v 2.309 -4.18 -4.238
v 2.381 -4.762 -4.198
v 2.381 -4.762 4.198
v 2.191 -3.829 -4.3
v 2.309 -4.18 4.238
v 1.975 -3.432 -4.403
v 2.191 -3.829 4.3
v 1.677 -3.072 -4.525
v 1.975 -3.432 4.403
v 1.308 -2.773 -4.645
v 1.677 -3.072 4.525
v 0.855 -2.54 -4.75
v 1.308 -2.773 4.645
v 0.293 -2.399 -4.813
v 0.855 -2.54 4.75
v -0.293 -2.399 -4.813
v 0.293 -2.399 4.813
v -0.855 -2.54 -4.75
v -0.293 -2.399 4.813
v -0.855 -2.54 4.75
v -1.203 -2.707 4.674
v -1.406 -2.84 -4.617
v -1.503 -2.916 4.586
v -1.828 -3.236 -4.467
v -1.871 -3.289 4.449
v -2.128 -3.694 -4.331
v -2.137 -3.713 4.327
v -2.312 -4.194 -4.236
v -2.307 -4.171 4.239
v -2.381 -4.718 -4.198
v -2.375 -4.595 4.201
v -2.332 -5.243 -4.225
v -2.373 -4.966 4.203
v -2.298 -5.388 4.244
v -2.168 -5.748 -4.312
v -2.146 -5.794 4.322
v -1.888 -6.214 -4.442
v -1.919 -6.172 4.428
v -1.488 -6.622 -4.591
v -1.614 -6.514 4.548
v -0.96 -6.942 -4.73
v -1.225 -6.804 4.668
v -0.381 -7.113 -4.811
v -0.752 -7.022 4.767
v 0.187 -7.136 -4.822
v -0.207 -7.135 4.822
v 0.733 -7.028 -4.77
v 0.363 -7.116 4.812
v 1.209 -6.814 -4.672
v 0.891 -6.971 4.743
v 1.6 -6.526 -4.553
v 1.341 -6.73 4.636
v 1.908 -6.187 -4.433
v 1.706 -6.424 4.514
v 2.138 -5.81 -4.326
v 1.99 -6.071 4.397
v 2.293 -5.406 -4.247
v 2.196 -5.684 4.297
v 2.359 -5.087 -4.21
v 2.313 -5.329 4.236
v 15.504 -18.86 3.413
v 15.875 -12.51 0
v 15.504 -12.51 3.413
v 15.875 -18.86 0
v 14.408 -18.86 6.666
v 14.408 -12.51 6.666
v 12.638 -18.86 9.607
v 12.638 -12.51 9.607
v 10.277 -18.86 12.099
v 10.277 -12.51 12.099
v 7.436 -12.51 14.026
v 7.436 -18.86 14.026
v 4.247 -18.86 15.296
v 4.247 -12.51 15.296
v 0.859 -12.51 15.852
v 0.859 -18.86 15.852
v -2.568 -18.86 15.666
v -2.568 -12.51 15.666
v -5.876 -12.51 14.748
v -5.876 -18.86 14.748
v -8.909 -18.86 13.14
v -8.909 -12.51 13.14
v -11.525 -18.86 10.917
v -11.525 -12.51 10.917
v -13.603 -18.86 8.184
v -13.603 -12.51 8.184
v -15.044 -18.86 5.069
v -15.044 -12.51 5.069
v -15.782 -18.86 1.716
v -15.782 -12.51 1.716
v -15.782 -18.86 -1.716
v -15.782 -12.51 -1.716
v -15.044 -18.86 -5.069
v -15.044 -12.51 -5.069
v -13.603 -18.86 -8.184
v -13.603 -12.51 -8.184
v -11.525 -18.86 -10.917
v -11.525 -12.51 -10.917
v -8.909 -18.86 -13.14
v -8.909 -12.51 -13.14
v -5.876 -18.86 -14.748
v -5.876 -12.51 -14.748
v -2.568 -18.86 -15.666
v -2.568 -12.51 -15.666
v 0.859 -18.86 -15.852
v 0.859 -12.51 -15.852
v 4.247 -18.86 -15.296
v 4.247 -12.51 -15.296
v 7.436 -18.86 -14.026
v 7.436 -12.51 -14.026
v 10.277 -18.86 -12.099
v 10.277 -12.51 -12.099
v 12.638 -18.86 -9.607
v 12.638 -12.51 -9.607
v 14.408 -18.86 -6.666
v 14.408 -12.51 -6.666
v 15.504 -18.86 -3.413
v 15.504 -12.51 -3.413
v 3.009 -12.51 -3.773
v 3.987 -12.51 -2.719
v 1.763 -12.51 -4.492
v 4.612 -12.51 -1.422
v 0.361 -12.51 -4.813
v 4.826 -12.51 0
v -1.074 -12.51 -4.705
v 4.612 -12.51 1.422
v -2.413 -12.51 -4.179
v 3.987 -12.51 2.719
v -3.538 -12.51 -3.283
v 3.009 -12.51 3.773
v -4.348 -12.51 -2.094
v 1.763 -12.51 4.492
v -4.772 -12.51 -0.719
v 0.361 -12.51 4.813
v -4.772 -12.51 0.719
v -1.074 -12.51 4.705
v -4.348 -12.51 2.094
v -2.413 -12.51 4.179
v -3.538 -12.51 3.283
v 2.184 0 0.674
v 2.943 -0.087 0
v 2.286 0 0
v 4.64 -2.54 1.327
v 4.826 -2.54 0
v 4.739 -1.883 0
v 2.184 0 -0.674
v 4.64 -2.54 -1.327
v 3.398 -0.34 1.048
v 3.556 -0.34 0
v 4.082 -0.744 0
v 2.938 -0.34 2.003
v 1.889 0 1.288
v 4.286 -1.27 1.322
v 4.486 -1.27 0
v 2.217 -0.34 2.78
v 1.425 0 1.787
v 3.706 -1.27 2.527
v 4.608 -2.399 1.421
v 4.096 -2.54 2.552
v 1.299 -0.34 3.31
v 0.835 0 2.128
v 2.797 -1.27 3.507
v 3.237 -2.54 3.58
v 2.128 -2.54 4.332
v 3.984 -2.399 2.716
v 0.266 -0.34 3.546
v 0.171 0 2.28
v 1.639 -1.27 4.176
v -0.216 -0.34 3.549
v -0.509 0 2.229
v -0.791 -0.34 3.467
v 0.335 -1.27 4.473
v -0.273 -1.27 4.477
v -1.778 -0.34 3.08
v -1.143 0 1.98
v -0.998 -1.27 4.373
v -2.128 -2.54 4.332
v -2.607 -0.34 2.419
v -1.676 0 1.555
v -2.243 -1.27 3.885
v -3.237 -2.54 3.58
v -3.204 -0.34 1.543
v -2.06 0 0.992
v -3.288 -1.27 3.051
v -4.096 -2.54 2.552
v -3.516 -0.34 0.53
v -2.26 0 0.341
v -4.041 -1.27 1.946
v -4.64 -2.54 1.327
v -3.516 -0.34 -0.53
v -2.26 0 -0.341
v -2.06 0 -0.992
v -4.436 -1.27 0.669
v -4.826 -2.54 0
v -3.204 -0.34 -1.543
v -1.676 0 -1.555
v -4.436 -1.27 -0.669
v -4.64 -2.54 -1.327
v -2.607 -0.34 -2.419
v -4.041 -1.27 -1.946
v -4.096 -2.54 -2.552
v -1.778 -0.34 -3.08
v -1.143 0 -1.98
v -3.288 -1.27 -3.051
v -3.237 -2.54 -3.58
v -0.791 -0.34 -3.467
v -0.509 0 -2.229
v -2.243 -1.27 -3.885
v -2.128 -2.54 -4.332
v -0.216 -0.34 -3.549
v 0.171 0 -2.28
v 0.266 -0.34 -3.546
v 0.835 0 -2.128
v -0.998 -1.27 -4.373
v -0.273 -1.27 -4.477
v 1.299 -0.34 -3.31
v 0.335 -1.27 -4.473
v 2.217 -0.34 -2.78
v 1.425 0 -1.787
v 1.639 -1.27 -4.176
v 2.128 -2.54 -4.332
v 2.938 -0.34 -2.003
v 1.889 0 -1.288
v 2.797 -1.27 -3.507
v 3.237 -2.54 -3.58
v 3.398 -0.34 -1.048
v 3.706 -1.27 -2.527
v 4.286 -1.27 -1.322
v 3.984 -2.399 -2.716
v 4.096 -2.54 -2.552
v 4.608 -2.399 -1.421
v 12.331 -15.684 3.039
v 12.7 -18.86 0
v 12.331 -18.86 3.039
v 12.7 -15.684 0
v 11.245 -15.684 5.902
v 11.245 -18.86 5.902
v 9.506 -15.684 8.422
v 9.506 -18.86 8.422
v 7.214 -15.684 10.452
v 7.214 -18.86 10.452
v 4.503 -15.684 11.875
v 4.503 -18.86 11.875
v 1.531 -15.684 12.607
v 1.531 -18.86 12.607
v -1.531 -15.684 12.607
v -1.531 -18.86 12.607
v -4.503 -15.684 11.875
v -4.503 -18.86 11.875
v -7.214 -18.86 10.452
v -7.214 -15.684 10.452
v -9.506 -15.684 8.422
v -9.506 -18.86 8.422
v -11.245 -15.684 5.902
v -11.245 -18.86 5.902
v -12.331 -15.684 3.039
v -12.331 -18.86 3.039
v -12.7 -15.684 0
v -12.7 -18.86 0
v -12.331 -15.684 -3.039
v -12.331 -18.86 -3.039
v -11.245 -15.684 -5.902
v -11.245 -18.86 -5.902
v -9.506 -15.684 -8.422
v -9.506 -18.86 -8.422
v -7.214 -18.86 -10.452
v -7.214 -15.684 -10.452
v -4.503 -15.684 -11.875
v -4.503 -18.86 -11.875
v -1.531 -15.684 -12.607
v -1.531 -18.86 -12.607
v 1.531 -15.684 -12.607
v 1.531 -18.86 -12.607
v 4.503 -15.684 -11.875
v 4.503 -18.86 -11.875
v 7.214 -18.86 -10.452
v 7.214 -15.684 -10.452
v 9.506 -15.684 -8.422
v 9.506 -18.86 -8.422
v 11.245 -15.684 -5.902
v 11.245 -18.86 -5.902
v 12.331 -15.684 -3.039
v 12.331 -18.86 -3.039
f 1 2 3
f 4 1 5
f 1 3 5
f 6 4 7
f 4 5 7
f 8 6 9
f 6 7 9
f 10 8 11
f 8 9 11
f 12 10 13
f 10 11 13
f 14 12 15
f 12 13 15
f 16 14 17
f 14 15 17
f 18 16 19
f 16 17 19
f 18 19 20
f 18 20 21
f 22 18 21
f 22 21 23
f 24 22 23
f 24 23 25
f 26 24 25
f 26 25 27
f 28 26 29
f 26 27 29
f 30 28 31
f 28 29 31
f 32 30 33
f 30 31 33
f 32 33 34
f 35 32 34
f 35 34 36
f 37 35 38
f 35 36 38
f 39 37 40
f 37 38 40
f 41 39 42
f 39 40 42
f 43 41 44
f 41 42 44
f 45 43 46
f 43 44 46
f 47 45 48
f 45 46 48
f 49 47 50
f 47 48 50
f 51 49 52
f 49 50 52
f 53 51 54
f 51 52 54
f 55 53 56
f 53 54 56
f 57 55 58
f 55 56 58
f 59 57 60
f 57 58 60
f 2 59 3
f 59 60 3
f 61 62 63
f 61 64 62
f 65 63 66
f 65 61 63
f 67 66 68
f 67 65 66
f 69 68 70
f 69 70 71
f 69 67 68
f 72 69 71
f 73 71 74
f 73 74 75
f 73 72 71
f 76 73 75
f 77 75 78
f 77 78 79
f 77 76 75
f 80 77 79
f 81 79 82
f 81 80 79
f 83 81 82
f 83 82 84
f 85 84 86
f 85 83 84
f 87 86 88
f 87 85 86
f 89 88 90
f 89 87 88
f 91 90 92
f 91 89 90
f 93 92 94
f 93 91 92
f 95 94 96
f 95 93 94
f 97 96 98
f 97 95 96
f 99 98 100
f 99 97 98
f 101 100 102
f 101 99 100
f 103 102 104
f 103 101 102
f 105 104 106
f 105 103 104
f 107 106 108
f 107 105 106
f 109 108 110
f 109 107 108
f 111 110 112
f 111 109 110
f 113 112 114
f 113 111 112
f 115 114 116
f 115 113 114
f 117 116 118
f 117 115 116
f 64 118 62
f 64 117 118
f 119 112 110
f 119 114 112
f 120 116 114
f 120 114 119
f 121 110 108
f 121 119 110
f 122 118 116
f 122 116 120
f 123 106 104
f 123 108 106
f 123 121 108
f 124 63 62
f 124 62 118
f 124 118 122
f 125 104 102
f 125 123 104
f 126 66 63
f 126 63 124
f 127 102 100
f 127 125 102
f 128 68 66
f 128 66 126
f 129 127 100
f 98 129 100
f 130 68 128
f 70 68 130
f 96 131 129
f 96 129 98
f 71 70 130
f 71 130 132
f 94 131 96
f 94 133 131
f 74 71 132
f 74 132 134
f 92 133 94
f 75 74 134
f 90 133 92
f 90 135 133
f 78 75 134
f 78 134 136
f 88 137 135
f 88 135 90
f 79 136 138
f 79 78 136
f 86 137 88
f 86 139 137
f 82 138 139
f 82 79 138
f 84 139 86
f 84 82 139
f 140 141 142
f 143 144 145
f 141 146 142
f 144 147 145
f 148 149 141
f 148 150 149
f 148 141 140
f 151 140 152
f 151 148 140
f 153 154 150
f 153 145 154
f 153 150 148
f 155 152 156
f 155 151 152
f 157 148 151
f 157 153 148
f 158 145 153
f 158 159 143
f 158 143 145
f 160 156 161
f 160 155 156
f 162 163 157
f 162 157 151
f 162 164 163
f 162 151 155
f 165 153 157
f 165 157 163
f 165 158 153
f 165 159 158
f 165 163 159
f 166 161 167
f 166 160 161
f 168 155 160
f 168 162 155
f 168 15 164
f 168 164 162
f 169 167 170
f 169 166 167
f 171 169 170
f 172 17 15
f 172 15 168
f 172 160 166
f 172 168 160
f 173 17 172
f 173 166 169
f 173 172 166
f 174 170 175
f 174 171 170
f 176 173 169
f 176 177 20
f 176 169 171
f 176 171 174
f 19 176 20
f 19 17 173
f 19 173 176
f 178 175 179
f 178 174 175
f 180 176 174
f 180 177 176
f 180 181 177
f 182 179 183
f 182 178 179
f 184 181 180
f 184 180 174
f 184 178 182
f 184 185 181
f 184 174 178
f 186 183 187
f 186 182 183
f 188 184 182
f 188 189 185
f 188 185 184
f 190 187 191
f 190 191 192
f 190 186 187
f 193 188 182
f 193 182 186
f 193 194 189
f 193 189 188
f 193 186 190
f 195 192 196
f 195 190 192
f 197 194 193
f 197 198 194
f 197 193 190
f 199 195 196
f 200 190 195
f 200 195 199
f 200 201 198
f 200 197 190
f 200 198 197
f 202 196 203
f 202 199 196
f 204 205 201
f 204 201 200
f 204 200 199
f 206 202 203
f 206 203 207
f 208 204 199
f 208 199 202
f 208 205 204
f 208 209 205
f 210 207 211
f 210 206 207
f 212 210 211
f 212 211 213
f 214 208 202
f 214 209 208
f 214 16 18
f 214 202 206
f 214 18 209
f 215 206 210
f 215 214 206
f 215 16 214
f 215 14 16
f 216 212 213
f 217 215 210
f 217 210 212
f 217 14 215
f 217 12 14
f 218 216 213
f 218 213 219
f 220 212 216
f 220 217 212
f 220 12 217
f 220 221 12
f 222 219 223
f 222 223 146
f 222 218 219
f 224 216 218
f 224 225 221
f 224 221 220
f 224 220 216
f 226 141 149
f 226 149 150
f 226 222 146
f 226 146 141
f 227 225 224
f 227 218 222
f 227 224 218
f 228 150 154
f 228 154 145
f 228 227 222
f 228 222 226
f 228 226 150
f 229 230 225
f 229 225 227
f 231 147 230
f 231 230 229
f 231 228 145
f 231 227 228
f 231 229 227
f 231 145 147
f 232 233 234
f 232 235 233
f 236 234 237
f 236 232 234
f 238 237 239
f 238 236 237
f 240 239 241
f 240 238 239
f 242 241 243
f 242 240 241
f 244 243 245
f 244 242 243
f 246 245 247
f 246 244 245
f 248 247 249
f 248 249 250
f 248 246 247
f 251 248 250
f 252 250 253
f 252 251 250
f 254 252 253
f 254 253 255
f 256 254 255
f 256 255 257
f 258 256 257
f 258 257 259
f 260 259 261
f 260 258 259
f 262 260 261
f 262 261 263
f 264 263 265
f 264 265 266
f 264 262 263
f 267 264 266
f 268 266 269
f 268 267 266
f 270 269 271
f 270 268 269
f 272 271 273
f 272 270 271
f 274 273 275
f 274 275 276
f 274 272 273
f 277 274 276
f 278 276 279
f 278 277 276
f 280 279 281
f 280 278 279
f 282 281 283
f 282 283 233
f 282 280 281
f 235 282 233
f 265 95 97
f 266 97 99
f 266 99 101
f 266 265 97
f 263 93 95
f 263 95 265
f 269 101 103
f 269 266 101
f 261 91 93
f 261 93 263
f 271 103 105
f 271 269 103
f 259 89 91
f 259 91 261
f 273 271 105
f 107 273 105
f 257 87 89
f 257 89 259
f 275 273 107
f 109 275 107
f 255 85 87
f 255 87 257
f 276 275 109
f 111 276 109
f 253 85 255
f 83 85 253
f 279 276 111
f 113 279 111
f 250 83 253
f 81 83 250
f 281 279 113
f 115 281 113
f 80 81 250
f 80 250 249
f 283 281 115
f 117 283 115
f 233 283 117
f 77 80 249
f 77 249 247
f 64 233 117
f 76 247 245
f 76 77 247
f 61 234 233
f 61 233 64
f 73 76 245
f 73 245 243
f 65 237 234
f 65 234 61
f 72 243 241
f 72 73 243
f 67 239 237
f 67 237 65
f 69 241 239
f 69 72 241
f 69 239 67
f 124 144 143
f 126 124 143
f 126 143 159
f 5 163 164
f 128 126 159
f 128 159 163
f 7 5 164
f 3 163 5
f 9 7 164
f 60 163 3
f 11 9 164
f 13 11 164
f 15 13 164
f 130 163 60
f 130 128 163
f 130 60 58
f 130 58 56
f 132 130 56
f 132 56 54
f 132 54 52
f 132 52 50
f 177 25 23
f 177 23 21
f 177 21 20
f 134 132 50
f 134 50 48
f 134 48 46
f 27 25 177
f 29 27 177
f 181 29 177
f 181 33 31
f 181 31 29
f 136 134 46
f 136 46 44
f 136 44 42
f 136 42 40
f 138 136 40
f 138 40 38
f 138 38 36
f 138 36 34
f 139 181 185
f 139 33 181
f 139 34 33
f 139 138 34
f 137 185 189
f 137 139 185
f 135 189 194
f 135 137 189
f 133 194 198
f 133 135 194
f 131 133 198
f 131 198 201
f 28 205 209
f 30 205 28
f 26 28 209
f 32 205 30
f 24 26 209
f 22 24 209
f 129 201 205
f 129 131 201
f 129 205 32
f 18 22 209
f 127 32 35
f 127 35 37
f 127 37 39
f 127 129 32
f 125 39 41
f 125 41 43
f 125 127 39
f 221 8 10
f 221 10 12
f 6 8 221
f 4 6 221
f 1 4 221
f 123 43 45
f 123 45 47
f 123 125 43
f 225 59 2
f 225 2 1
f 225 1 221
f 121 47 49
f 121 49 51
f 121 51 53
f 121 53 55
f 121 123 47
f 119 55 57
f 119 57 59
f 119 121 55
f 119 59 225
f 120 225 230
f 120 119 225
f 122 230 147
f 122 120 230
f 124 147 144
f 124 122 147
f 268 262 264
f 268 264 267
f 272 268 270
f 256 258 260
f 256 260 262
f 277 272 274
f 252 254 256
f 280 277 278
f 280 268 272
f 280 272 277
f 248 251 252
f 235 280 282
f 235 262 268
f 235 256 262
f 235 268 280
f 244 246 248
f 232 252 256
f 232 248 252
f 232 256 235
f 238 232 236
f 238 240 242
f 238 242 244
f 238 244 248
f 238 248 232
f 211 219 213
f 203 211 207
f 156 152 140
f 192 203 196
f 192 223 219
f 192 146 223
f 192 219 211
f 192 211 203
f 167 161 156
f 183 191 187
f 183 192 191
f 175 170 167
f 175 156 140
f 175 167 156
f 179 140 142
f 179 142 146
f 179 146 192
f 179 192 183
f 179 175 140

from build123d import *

# Parameters (mm, degrees)
SKETCH3_R          = 2.38125
CUT_EXTRUDE1_DEPTH = 19.045054718


with BuildPart() as part:
    # Sketch1 → Revolve1 (revolve)
    with BuildSketch(Plane.XY):
        with BuildLine():
            Line((0, 0), (2.286, 0))
            ThreePointArc((2.286, 0), (4.082051224, -0.743948776), (4.826, -2.54))
            Line((4.826, -2.54), (4.826, -12.5095))
            Line((4.826, -12.5095), (15.875, -12.5095))
            Line((15.875, -12.5095), (15.875, -18.8595))
            Line((15.875, -18.8595), (12.7, -18.8595))
            Line((12.7, -18.8595), (12.7, -15.6845))
            Line((12.7, -15.6845), (0, -15.6845))
            Line((0, -15.6845), (0, 0))
        make_face()
    revolve(axis=Axis((0, 0, 0), (0, -1, 0)))

    # Sketch3 → Cut-Extrude1 (cut)
    with BuildSketch(Plane.XY.offset(4.826)):
        with Locations((0, -4.7625)):
            Circle(SKETCH3_R)
    extrude(amount=-CUT_EXTRUDE1_DEPTH, mode=Mode.SUBTRACT)


solid = part.part
